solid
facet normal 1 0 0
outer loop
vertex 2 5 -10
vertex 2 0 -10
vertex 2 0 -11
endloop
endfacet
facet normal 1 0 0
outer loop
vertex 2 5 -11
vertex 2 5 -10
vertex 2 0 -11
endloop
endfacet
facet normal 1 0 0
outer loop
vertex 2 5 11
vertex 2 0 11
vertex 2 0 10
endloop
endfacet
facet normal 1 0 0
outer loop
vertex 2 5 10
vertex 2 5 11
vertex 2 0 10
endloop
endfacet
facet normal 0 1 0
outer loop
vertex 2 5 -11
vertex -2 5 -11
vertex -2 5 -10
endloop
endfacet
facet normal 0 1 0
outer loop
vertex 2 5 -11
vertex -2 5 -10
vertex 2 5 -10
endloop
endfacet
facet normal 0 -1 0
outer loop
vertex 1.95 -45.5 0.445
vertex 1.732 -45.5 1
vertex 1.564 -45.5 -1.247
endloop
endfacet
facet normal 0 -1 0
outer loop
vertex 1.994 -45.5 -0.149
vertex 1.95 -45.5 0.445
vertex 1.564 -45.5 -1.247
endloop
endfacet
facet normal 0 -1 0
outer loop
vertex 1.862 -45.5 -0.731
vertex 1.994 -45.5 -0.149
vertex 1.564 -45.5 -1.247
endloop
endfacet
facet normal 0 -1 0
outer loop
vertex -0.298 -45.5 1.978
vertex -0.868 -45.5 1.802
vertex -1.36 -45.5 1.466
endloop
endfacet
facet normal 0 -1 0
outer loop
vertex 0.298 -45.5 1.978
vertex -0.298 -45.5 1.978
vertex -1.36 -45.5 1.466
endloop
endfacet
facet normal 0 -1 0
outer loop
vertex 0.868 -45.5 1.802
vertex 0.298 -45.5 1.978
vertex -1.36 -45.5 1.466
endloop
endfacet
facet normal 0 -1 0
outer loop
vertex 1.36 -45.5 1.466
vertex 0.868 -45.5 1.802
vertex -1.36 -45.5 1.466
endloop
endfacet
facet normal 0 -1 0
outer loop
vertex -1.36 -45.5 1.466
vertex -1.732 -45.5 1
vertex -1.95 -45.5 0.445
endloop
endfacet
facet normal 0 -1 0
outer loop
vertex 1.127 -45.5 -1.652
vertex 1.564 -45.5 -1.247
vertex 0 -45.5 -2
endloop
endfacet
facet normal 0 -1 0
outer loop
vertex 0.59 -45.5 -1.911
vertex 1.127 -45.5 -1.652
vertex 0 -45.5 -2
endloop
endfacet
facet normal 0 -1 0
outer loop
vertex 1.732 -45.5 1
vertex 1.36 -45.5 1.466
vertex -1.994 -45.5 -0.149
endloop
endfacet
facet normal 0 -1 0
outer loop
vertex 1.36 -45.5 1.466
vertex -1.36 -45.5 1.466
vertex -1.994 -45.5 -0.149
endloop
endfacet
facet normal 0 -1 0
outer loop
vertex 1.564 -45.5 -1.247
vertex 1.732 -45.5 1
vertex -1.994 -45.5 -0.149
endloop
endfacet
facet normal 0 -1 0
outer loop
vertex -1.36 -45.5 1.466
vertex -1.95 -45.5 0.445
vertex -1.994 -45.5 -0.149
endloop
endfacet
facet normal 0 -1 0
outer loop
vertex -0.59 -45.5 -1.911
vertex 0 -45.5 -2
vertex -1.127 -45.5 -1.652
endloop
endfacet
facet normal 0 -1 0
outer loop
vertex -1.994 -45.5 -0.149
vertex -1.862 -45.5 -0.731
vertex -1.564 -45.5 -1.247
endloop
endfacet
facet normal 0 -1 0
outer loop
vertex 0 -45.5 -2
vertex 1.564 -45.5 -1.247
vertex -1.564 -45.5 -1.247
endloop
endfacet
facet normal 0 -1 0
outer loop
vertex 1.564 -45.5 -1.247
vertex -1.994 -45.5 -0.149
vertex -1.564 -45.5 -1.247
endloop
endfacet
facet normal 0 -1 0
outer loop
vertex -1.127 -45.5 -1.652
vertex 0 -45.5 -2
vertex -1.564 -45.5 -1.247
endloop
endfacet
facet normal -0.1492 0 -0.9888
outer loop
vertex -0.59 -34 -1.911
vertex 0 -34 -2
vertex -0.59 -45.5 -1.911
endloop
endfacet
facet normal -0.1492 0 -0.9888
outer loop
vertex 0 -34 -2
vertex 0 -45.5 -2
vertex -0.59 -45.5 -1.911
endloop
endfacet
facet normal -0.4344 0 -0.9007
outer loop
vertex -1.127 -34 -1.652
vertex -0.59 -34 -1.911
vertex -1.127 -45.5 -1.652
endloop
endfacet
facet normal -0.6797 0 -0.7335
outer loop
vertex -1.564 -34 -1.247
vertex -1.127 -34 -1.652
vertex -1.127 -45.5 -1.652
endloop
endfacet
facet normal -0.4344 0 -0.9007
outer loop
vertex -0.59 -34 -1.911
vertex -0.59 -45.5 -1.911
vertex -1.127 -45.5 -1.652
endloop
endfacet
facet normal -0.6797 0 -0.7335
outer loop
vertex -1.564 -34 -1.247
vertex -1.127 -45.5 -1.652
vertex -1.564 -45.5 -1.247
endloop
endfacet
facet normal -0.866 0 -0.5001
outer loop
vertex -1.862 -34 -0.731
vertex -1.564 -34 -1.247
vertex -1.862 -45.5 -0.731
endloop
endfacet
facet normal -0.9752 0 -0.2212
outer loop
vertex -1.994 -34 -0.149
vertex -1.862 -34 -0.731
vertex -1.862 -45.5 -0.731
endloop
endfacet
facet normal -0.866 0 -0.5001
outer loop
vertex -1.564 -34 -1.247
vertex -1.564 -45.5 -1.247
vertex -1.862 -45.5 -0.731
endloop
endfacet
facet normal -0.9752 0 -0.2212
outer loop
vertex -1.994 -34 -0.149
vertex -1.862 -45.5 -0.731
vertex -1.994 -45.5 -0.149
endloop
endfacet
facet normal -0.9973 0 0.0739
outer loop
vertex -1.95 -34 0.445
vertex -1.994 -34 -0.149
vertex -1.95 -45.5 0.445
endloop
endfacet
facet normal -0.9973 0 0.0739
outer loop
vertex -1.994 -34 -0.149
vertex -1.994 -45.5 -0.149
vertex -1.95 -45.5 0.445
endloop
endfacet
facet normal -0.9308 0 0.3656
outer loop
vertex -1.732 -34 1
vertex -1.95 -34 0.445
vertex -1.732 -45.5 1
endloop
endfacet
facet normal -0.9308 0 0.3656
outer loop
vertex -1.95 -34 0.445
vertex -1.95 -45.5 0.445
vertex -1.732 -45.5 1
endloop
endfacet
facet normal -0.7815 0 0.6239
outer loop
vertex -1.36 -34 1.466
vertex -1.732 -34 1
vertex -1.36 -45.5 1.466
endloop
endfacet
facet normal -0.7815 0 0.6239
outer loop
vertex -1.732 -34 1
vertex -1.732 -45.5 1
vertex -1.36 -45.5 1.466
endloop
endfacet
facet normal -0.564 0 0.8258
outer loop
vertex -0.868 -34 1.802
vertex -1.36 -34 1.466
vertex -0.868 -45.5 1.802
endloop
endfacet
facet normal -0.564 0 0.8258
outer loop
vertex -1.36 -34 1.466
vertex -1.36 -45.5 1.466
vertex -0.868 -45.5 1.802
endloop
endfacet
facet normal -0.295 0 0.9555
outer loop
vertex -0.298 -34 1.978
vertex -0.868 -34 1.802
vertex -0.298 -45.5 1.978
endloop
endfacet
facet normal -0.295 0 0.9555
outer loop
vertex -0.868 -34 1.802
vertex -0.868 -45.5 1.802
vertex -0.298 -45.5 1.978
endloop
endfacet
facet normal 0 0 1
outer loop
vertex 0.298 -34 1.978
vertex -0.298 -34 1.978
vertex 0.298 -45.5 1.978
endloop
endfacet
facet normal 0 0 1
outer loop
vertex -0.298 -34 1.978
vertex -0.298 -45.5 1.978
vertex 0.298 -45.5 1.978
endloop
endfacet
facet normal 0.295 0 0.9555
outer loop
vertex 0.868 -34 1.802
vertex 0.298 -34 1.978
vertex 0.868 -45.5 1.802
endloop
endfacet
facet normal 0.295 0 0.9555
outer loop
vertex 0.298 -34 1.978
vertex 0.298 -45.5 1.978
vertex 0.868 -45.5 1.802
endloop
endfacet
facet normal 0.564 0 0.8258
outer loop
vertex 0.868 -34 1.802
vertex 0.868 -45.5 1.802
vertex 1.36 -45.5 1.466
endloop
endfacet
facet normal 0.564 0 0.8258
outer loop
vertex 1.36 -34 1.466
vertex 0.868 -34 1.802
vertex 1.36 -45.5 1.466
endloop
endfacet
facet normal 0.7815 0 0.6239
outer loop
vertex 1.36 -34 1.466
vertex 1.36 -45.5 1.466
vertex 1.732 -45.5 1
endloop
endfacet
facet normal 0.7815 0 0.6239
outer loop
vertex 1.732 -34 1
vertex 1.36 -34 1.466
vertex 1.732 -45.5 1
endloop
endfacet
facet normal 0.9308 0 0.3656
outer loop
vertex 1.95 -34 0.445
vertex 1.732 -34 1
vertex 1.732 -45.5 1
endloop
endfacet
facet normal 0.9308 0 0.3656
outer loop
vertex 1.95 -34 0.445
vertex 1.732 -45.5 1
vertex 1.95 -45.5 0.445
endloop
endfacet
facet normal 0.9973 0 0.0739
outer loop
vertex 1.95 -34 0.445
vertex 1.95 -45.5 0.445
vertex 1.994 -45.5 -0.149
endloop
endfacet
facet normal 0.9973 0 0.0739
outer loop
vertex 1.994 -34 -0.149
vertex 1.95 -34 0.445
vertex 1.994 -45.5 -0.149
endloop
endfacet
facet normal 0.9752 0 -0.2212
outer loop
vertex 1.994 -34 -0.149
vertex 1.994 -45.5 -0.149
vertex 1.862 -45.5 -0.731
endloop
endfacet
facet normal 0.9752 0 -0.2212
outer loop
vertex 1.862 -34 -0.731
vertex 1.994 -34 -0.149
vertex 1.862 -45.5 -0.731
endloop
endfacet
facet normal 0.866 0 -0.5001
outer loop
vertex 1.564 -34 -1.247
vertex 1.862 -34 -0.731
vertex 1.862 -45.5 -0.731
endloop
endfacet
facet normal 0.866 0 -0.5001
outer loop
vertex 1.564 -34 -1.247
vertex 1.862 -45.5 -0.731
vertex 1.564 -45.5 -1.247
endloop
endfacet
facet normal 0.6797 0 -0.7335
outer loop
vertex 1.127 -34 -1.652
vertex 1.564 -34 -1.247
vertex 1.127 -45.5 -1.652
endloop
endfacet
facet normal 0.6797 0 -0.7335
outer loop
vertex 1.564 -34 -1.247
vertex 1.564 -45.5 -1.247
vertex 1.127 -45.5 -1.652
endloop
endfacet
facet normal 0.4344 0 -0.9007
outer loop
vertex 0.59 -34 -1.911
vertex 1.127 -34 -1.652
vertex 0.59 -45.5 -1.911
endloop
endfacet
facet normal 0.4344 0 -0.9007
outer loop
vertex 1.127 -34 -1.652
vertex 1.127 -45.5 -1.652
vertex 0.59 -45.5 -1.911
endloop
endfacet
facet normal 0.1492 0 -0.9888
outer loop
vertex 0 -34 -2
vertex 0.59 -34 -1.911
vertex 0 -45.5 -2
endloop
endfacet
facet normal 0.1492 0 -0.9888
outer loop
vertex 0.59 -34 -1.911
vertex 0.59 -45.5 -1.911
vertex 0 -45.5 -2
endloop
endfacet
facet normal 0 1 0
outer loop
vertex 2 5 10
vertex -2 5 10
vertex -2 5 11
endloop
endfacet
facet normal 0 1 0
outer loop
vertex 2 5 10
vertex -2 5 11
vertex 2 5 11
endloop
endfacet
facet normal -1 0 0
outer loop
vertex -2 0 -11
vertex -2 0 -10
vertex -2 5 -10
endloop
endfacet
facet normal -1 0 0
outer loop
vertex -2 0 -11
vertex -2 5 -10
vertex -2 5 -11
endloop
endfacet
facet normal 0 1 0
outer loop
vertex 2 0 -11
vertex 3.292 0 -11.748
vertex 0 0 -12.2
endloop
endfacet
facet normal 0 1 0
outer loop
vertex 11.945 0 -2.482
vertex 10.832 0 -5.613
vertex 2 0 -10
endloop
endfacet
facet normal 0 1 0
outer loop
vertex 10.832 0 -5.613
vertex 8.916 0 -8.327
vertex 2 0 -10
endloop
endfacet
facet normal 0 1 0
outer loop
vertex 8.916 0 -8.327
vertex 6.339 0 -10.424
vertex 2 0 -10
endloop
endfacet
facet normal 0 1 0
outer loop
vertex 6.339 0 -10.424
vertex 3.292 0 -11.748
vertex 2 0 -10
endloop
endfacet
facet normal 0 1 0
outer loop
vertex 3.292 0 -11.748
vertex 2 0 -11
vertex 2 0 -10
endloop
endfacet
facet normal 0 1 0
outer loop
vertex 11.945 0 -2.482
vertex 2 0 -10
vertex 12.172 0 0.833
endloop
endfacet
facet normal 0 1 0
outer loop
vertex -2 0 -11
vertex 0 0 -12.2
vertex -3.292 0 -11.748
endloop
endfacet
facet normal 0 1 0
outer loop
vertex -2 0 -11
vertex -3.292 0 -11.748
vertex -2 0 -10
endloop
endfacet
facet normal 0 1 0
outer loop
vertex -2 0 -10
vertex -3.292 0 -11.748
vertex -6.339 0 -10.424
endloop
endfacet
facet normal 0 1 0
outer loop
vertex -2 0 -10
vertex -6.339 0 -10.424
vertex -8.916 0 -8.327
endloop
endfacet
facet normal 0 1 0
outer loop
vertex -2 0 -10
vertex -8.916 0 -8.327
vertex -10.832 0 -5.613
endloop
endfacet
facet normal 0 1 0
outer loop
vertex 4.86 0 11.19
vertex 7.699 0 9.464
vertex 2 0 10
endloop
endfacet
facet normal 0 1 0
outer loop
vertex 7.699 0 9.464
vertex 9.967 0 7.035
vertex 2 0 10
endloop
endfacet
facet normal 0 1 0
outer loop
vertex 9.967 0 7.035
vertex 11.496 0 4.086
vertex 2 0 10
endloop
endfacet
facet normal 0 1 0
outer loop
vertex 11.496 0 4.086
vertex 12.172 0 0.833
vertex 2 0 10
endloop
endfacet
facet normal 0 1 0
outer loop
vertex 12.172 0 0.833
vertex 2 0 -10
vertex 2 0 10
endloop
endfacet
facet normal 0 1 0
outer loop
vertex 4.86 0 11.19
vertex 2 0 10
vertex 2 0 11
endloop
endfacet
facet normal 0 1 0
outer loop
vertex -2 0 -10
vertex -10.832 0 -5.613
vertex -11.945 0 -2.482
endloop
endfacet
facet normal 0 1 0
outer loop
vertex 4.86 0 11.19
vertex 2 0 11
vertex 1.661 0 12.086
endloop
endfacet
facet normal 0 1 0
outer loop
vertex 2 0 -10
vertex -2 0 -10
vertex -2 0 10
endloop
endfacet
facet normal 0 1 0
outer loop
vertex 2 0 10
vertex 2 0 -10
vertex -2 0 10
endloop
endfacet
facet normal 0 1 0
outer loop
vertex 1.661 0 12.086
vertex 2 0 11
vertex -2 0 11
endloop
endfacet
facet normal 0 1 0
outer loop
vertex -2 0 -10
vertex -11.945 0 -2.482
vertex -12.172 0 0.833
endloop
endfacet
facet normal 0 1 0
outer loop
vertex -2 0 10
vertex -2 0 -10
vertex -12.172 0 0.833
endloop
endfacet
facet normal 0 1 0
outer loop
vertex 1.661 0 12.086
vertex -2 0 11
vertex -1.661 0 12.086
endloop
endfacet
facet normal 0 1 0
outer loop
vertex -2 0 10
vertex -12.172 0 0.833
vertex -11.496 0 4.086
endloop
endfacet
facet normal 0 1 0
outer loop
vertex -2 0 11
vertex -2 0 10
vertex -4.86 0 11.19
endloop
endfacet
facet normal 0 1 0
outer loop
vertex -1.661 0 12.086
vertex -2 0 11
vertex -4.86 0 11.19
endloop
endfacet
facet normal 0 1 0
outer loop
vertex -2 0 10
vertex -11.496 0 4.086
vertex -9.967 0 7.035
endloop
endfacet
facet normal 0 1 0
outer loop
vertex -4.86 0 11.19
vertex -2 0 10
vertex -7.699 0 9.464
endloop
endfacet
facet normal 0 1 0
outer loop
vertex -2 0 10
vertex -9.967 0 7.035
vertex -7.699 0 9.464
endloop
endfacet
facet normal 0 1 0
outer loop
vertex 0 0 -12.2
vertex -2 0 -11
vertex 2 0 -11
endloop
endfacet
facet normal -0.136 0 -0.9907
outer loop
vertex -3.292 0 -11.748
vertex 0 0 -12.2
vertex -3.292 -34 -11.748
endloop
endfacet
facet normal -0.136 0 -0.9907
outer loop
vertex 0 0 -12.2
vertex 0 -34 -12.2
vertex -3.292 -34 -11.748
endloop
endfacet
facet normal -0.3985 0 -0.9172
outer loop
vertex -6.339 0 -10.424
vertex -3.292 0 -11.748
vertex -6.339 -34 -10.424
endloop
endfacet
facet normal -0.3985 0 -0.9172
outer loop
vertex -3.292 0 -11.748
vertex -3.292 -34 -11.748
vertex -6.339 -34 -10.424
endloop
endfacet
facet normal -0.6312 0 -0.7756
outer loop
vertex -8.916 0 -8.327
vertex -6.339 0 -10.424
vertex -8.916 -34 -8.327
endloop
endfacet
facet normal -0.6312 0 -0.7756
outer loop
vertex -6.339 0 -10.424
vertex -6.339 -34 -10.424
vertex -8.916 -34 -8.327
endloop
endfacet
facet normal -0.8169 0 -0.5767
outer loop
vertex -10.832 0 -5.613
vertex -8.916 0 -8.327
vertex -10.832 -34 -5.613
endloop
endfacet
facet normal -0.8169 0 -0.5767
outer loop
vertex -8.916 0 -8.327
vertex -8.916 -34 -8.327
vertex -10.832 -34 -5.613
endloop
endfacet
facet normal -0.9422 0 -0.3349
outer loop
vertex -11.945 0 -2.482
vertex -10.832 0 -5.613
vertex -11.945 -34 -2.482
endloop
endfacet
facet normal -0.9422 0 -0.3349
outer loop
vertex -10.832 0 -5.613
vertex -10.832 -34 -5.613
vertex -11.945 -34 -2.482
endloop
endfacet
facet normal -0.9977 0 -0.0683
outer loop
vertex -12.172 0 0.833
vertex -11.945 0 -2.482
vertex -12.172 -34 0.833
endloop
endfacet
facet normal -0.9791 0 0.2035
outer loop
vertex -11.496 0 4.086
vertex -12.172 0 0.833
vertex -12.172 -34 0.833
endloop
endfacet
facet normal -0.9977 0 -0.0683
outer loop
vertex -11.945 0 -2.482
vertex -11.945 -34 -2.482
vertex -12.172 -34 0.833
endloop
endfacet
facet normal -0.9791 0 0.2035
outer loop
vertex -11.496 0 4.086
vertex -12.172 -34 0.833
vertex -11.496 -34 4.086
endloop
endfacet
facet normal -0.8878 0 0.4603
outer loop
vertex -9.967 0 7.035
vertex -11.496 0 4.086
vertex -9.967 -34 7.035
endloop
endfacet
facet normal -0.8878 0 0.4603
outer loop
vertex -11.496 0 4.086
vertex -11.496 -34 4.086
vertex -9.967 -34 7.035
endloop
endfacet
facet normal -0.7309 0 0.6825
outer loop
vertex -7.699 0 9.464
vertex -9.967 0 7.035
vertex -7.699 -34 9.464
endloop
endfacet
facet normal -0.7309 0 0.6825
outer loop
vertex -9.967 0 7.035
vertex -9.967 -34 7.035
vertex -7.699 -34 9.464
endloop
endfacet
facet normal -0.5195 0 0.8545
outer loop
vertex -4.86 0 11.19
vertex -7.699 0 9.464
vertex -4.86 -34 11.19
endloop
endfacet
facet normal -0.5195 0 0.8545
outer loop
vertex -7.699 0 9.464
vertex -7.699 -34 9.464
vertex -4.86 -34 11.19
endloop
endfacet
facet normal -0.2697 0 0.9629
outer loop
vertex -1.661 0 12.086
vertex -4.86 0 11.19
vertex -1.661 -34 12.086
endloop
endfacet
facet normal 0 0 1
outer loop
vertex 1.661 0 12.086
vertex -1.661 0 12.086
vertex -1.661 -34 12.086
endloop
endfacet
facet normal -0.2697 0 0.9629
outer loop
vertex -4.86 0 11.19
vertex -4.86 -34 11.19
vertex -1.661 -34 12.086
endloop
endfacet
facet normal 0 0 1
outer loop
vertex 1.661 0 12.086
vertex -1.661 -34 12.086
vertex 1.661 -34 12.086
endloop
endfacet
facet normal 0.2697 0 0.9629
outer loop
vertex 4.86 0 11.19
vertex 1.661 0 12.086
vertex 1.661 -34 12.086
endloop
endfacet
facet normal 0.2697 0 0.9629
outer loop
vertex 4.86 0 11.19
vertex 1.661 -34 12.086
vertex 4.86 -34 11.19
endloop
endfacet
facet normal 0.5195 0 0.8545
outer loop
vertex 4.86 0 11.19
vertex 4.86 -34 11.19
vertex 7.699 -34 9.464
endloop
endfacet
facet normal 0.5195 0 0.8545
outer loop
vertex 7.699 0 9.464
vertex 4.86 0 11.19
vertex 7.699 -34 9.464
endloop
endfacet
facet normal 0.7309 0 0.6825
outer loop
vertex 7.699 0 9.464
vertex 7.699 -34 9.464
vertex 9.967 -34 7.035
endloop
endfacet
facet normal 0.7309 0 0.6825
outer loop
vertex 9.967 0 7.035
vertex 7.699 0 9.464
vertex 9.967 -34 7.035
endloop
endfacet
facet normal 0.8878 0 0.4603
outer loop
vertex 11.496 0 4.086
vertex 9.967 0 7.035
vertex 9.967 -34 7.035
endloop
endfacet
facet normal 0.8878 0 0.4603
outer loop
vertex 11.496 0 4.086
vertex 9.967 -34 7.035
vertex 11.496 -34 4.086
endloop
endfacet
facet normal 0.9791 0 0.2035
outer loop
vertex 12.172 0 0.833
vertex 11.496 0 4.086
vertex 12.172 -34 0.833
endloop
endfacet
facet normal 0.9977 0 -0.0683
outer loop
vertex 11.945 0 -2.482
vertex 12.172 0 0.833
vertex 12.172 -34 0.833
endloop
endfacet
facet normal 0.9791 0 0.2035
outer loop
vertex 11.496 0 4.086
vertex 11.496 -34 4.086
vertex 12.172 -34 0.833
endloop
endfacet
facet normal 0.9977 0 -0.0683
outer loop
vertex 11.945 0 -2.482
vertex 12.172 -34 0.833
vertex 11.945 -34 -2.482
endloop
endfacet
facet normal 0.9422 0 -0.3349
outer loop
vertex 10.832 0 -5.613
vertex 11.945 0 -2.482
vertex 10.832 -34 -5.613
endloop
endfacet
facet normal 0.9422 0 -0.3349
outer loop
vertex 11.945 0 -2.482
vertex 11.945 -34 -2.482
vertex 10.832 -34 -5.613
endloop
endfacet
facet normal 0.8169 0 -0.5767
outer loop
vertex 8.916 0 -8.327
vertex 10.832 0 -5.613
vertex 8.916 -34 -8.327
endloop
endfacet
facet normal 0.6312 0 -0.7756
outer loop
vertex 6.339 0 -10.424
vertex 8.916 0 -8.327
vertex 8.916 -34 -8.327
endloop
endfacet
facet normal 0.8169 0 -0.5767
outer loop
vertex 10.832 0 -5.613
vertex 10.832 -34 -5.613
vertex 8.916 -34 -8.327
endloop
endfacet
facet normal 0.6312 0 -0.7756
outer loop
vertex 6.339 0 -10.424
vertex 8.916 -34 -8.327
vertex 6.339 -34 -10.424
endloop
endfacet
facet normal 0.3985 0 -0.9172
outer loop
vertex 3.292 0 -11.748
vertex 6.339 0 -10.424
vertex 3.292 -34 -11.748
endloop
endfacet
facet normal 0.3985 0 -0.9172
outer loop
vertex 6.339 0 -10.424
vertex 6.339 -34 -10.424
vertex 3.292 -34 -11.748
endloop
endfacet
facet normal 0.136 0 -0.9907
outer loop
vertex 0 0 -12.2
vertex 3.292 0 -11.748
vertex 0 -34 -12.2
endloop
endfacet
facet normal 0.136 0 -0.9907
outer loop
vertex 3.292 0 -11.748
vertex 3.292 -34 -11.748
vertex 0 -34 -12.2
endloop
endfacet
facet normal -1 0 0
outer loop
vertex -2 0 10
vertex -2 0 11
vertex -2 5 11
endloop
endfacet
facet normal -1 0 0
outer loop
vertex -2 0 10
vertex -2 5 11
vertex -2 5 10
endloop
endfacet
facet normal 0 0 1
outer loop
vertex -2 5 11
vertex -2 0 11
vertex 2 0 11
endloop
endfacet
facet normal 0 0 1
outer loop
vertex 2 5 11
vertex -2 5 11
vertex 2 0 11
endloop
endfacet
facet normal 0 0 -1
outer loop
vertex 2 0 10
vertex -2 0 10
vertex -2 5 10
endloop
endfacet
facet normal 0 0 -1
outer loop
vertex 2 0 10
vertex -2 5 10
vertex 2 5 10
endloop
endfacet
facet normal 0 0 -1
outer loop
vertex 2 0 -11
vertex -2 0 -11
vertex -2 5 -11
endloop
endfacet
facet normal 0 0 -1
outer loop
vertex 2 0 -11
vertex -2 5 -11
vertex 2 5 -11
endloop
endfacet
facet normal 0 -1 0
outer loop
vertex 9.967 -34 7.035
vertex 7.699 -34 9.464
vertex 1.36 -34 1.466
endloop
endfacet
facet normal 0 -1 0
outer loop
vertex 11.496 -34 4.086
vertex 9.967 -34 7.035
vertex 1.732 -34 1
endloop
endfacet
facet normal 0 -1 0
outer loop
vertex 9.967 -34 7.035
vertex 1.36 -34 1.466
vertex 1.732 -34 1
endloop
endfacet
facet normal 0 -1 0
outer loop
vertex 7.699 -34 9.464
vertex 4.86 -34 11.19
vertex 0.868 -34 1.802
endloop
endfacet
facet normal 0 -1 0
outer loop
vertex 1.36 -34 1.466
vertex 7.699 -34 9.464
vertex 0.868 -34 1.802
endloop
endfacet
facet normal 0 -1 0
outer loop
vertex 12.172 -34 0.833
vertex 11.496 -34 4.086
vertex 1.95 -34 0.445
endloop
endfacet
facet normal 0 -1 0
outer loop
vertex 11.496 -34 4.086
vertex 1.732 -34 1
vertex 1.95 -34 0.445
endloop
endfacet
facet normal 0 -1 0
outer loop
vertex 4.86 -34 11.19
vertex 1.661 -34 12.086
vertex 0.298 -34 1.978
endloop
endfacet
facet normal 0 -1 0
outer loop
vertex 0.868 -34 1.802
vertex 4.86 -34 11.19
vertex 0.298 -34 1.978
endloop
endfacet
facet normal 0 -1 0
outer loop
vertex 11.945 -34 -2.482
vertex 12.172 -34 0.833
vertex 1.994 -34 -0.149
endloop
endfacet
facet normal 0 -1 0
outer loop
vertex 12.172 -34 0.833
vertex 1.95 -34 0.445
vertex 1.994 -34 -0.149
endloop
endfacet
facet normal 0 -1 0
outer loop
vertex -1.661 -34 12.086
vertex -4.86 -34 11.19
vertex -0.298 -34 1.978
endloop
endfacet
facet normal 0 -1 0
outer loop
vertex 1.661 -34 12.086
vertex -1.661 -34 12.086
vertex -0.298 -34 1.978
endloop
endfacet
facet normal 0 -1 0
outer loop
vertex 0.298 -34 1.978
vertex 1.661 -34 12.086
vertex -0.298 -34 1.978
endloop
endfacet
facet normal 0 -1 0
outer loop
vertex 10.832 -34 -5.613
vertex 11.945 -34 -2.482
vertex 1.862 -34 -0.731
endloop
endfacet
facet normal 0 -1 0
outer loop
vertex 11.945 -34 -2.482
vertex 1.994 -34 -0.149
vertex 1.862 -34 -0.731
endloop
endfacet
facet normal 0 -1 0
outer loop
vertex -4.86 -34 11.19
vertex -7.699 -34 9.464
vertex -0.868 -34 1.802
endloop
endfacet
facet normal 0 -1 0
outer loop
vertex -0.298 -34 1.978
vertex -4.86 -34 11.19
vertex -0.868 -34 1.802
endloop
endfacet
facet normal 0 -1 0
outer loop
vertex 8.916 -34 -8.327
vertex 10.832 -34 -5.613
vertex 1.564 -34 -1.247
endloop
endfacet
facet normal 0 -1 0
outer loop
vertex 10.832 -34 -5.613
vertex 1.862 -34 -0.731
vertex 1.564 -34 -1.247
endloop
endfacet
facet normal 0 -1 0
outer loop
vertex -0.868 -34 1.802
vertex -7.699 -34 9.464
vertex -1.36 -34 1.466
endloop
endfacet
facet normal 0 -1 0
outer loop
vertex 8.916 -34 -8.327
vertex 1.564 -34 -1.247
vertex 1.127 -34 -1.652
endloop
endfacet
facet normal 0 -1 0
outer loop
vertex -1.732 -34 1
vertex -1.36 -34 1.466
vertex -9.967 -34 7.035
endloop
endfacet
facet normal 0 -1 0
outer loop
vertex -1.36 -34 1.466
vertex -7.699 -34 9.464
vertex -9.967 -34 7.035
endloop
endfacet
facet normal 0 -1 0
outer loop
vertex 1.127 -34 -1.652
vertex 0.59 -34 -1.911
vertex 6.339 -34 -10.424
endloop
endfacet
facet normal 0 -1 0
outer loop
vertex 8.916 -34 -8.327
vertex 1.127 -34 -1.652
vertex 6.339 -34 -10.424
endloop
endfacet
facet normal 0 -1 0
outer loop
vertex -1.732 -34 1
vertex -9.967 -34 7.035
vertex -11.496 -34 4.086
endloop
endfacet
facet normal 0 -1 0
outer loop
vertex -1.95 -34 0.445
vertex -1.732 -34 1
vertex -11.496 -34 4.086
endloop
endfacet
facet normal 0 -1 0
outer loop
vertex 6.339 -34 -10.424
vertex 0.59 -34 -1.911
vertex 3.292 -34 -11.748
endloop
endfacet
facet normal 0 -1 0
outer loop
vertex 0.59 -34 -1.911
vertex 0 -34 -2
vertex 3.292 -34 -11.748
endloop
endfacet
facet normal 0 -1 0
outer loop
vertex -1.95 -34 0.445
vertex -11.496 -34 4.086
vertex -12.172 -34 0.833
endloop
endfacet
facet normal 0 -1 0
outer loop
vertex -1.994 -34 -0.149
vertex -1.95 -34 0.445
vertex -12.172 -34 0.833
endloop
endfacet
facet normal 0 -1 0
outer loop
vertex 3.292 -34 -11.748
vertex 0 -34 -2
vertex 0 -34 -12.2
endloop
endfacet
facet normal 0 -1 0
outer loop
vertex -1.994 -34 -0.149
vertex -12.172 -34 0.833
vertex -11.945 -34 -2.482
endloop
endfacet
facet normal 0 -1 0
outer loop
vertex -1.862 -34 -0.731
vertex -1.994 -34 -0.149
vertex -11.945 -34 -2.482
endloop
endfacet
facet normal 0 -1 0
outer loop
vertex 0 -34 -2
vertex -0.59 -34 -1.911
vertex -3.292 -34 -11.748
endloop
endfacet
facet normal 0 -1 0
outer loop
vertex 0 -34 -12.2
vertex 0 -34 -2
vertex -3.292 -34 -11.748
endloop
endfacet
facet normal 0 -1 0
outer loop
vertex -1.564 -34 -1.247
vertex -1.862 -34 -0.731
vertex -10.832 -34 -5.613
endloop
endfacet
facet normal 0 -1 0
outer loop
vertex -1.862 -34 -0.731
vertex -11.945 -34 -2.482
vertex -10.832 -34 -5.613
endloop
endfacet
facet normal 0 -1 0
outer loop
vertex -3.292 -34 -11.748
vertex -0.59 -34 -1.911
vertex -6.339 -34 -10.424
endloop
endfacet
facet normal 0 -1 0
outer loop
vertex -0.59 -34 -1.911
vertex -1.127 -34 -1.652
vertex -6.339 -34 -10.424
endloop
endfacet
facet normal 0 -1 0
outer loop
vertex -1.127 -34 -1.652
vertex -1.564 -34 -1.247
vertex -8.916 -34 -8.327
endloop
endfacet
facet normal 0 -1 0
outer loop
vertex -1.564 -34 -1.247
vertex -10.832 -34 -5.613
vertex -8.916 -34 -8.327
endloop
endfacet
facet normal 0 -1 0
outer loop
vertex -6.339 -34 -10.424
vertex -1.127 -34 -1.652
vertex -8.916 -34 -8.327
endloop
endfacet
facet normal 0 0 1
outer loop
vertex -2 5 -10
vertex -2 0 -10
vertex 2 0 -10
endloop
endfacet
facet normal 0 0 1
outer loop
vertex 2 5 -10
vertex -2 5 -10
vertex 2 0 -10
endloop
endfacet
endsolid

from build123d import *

# Parameters (mm, degrees)
SKETCH2_W           = 4
SKETCH2_H           = 1
BOSS_EXTRUDE1_DEPTH = 5


with BuildPart() as part:
    # Sketch1 → Revolve1 (revolve)
    with BuildSketch(Plane.XY, mode=Mode.PRIVATE) as revolve1_sk:
        Polygon((0, 0), (12.2, 0), (12.2, -34), (2, -34), (2, -45.5), (0, -45.5), align=None)
    revolve(revolve1_sk.sketch.rotate(Axis((0, -45.5, 0), (0, 1, 0)), 90), axis=Axis((0, -45.5, 0), (0, 1, 0)))

    # Sketch2 → Boss-Extrude1 (add)
    with BuildSketch(Plane(origin=(0, 0, 0), x_dir=(1, 0, 0), z_dir=(0, 1, 0))):
        with Locations((0, -10.5)):
            Rectangle(SKETCH2_W, SKETCH2_H)
        with Locations((0, 10.5)):
            Rectangle(SKETCH2_W, SKETCH2_H)
    extrude(amount=BOSS_EXTRUDE1_DEPTH)


solid = part.part
